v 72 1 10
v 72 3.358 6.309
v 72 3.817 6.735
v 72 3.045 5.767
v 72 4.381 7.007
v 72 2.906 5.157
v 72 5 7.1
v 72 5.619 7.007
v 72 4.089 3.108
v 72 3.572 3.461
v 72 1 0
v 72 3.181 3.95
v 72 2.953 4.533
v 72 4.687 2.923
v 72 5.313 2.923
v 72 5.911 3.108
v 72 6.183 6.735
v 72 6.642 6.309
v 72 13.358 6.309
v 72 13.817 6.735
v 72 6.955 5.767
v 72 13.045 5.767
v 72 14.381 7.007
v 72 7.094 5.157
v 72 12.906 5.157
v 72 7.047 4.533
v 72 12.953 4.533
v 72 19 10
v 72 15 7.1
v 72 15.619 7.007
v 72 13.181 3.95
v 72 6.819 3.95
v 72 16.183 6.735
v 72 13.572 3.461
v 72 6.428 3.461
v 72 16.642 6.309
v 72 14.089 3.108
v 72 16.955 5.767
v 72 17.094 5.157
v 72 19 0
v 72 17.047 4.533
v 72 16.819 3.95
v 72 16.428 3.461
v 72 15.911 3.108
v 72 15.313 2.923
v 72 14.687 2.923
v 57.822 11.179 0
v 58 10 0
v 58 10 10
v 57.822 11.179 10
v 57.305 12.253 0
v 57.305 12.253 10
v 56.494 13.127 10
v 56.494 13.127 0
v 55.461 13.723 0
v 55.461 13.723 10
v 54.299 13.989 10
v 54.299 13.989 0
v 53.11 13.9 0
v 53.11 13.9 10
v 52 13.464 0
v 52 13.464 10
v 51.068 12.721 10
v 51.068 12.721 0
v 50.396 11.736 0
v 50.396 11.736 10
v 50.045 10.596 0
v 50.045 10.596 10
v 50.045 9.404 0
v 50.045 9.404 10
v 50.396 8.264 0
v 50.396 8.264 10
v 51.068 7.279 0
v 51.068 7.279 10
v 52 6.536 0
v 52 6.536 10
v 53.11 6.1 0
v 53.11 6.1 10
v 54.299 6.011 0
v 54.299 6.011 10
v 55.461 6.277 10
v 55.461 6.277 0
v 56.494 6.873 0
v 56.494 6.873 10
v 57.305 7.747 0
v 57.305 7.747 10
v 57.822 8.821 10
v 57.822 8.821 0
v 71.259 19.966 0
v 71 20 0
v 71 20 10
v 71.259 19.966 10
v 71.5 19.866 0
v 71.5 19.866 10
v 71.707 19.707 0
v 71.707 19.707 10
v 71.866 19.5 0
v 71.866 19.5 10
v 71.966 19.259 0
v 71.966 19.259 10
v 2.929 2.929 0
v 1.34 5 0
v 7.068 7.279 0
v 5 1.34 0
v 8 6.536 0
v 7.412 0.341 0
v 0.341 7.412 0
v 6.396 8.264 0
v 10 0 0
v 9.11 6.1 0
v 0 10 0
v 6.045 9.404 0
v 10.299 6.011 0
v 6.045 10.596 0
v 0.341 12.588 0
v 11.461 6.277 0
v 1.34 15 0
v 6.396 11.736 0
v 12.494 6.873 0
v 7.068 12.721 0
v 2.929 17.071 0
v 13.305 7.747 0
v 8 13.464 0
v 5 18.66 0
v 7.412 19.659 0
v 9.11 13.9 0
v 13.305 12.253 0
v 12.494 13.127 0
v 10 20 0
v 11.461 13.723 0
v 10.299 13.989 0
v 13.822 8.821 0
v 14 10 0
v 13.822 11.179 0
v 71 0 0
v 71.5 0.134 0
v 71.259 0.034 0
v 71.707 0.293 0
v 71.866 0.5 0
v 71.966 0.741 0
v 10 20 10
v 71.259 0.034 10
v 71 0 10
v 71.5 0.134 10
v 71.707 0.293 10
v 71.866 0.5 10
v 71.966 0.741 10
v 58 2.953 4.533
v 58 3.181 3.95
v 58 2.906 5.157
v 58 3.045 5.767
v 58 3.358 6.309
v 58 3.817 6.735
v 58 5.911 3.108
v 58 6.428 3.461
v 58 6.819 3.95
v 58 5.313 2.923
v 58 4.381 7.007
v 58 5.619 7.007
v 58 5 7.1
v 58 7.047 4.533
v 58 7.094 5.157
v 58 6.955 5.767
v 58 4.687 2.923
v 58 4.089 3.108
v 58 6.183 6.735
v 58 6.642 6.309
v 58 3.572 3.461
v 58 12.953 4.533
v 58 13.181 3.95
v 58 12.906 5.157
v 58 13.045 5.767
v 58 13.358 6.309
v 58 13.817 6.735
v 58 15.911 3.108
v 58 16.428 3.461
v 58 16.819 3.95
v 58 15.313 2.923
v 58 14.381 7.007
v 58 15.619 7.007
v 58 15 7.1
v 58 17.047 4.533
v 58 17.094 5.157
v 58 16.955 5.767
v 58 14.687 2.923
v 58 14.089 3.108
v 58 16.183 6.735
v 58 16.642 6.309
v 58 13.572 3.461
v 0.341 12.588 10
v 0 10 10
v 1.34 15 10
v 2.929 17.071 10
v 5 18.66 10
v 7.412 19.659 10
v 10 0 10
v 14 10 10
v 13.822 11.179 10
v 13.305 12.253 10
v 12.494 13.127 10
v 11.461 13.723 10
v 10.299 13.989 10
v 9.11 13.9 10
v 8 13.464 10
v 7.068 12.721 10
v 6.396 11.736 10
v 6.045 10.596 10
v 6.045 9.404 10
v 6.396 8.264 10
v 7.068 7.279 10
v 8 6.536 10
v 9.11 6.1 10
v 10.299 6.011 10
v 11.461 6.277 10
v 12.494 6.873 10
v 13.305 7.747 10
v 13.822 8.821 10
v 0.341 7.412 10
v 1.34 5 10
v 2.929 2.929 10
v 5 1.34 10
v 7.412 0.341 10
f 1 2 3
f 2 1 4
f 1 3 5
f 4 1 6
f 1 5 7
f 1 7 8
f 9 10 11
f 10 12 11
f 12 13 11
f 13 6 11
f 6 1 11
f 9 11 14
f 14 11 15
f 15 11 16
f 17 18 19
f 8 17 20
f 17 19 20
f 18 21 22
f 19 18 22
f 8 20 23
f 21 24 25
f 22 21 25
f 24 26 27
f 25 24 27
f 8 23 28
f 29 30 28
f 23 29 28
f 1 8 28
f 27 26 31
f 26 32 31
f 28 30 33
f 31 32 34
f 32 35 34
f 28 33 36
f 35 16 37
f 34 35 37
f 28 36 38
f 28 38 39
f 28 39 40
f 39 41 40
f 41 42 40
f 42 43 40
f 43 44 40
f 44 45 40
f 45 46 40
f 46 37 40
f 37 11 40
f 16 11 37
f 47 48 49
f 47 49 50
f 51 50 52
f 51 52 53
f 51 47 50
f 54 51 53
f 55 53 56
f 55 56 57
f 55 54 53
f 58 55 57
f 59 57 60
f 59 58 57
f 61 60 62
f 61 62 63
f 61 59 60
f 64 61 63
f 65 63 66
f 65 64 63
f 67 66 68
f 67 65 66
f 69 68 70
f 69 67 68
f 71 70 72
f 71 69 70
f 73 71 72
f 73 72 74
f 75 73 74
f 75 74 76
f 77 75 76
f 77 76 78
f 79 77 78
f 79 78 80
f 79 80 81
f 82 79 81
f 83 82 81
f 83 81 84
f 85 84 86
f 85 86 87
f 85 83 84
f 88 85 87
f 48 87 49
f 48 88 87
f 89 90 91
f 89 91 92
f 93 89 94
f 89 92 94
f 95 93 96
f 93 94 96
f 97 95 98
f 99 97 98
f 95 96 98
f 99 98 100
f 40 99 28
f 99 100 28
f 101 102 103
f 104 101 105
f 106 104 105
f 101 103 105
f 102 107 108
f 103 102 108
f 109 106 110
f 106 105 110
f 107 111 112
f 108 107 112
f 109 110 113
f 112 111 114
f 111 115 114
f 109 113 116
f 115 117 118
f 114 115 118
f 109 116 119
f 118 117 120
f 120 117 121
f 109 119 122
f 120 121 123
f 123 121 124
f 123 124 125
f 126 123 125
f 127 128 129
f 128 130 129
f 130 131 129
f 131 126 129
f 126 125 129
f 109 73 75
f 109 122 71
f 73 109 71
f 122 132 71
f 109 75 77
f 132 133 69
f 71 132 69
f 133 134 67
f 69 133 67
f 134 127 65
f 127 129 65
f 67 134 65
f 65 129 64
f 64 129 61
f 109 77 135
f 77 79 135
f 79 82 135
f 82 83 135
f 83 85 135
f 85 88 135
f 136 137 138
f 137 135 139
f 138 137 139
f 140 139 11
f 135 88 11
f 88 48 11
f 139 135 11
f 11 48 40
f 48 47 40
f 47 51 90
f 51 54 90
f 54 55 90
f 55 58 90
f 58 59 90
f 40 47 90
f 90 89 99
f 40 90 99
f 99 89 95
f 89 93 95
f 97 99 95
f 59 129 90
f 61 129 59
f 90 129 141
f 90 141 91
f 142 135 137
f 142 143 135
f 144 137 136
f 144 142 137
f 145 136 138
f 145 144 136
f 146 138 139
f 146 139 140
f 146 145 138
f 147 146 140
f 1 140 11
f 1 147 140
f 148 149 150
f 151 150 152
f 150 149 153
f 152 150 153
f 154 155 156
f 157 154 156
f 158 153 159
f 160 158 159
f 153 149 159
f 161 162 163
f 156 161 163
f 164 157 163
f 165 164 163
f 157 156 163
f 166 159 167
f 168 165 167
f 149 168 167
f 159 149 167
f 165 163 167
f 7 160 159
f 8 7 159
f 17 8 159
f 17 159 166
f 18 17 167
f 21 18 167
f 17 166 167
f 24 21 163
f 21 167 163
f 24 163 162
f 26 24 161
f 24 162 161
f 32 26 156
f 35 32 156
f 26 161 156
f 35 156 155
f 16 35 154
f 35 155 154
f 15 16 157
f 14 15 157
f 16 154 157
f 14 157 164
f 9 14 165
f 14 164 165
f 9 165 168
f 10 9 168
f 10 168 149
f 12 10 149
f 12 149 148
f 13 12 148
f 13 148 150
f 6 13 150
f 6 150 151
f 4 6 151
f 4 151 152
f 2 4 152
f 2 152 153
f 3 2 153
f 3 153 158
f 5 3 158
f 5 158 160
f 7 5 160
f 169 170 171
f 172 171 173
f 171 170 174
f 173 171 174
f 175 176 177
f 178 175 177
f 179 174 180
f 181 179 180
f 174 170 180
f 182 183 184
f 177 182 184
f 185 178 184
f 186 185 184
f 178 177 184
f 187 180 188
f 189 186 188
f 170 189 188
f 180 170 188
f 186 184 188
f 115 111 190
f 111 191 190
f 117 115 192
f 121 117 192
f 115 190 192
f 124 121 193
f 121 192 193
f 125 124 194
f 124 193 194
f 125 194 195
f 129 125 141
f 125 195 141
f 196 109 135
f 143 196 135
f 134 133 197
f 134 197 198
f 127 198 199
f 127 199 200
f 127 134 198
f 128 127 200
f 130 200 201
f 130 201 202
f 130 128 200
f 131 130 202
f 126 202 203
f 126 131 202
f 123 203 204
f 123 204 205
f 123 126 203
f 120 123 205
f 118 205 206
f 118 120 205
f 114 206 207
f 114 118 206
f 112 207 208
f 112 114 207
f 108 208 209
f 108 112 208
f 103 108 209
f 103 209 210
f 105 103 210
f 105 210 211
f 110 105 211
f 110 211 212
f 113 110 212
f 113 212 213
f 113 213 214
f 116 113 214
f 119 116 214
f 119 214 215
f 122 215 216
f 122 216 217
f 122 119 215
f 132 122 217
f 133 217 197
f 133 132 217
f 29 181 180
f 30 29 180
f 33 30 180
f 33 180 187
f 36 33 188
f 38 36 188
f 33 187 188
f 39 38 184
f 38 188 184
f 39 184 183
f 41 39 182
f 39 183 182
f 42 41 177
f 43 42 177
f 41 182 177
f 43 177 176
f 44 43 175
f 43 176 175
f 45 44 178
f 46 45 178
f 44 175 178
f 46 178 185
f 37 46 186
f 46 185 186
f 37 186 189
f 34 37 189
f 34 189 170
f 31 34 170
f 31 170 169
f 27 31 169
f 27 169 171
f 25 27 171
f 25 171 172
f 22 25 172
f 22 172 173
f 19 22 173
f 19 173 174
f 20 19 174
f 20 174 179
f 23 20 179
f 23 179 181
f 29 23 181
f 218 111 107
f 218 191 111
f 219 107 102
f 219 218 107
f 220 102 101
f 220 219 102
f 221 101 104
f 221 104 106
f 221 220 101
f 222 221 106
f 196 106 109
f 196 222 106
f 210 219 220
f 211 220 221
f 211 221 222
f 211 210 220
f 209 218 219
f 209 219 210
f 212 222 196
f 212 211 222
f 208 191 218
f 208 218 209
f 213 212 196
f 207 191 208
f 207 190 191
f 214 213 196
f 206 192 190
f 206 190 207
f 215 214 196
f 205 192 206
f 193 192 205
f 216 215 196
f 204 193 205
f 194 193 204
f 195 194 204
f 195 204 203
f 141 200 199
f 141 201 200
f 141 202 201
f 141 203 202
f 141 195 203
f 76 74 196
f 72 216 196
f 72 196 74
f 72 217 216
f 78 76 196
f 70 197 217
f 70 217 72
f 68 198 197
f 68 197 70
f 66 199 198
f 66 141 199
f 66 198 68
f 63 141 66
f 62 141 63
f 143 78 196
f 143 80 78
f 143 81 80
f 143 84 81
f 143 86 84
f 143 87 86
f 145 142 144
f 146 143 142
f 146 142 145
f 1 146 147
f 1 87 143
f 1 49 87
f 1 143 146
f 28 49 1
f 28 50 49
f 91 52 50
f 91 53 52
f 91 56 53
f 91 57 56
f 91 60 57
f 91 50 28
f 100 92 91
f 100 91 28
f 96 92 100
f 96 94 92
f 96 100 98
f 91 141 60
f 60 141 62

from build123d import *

# Parameters (mm, degrees)
ESQUISSE1_W               = 72
ESQUISSE1_H               = 20
ESQUISSE1_R               = 4
BOSS_EXTRU_1_DEPTH        = 10
CONG_1_R                  = 10
TROU_TARAUD_M5X0_82_D     = 4.2
TROU_TARAUD_M5X0_82_DEPTH = 14
CONG_2_R                  = 1


with BuildPart() as part:
    # Esquisse1 → Boss.-Extru.1 (new body)
    with BuildSketch(Plane.XY):
        with Locations((36, 10)):
            Rectangle(ESQUISSE1_W, ESQUISSE1_H)
        with Locations((10, 10)):
            Circle(ESQUISSE1_R, mode=Mode.SUBTRACT)
        with Locations((54, 10)):
            Circle(ESQUISSE1_R, mode=Mode.SUBTRACT)
    extrude(amount=BOSS_EXTRU_1_DEPTH)

    # Congé1
    cong_1_edges = [part.edges().sort_by_distance(p)[0] for p in [
        (0, 0, 5),
        (0, 20, 5),
    ]]
    fillet(cong_1_edges, radius=CONG_1_R - 0.0001)  # a hair under: the kernel refuses the full size

    # Trou taraudé M5x0.82
    with Locations(Plane(origin=(72, 0, 0), x_dir=(0, 0, -1), z_dir=(1, 0, 0))):
        with Locations((-5, 15), (-5, 5)):
            Hole(TROU_TARAUD_M5X0_82_D / 2, depth=TROU_TARAUD_M5X0_82_DEPTH)

    # Congé2
    cong_2_edges = [part.edges().sort_by_distance(p)[0] for p in [
        (72, 0, 5),
        (72, 20, 5),
    ]]
    fillet(cong_2_edges, radius=CONG_2_R)


solid = part.part
